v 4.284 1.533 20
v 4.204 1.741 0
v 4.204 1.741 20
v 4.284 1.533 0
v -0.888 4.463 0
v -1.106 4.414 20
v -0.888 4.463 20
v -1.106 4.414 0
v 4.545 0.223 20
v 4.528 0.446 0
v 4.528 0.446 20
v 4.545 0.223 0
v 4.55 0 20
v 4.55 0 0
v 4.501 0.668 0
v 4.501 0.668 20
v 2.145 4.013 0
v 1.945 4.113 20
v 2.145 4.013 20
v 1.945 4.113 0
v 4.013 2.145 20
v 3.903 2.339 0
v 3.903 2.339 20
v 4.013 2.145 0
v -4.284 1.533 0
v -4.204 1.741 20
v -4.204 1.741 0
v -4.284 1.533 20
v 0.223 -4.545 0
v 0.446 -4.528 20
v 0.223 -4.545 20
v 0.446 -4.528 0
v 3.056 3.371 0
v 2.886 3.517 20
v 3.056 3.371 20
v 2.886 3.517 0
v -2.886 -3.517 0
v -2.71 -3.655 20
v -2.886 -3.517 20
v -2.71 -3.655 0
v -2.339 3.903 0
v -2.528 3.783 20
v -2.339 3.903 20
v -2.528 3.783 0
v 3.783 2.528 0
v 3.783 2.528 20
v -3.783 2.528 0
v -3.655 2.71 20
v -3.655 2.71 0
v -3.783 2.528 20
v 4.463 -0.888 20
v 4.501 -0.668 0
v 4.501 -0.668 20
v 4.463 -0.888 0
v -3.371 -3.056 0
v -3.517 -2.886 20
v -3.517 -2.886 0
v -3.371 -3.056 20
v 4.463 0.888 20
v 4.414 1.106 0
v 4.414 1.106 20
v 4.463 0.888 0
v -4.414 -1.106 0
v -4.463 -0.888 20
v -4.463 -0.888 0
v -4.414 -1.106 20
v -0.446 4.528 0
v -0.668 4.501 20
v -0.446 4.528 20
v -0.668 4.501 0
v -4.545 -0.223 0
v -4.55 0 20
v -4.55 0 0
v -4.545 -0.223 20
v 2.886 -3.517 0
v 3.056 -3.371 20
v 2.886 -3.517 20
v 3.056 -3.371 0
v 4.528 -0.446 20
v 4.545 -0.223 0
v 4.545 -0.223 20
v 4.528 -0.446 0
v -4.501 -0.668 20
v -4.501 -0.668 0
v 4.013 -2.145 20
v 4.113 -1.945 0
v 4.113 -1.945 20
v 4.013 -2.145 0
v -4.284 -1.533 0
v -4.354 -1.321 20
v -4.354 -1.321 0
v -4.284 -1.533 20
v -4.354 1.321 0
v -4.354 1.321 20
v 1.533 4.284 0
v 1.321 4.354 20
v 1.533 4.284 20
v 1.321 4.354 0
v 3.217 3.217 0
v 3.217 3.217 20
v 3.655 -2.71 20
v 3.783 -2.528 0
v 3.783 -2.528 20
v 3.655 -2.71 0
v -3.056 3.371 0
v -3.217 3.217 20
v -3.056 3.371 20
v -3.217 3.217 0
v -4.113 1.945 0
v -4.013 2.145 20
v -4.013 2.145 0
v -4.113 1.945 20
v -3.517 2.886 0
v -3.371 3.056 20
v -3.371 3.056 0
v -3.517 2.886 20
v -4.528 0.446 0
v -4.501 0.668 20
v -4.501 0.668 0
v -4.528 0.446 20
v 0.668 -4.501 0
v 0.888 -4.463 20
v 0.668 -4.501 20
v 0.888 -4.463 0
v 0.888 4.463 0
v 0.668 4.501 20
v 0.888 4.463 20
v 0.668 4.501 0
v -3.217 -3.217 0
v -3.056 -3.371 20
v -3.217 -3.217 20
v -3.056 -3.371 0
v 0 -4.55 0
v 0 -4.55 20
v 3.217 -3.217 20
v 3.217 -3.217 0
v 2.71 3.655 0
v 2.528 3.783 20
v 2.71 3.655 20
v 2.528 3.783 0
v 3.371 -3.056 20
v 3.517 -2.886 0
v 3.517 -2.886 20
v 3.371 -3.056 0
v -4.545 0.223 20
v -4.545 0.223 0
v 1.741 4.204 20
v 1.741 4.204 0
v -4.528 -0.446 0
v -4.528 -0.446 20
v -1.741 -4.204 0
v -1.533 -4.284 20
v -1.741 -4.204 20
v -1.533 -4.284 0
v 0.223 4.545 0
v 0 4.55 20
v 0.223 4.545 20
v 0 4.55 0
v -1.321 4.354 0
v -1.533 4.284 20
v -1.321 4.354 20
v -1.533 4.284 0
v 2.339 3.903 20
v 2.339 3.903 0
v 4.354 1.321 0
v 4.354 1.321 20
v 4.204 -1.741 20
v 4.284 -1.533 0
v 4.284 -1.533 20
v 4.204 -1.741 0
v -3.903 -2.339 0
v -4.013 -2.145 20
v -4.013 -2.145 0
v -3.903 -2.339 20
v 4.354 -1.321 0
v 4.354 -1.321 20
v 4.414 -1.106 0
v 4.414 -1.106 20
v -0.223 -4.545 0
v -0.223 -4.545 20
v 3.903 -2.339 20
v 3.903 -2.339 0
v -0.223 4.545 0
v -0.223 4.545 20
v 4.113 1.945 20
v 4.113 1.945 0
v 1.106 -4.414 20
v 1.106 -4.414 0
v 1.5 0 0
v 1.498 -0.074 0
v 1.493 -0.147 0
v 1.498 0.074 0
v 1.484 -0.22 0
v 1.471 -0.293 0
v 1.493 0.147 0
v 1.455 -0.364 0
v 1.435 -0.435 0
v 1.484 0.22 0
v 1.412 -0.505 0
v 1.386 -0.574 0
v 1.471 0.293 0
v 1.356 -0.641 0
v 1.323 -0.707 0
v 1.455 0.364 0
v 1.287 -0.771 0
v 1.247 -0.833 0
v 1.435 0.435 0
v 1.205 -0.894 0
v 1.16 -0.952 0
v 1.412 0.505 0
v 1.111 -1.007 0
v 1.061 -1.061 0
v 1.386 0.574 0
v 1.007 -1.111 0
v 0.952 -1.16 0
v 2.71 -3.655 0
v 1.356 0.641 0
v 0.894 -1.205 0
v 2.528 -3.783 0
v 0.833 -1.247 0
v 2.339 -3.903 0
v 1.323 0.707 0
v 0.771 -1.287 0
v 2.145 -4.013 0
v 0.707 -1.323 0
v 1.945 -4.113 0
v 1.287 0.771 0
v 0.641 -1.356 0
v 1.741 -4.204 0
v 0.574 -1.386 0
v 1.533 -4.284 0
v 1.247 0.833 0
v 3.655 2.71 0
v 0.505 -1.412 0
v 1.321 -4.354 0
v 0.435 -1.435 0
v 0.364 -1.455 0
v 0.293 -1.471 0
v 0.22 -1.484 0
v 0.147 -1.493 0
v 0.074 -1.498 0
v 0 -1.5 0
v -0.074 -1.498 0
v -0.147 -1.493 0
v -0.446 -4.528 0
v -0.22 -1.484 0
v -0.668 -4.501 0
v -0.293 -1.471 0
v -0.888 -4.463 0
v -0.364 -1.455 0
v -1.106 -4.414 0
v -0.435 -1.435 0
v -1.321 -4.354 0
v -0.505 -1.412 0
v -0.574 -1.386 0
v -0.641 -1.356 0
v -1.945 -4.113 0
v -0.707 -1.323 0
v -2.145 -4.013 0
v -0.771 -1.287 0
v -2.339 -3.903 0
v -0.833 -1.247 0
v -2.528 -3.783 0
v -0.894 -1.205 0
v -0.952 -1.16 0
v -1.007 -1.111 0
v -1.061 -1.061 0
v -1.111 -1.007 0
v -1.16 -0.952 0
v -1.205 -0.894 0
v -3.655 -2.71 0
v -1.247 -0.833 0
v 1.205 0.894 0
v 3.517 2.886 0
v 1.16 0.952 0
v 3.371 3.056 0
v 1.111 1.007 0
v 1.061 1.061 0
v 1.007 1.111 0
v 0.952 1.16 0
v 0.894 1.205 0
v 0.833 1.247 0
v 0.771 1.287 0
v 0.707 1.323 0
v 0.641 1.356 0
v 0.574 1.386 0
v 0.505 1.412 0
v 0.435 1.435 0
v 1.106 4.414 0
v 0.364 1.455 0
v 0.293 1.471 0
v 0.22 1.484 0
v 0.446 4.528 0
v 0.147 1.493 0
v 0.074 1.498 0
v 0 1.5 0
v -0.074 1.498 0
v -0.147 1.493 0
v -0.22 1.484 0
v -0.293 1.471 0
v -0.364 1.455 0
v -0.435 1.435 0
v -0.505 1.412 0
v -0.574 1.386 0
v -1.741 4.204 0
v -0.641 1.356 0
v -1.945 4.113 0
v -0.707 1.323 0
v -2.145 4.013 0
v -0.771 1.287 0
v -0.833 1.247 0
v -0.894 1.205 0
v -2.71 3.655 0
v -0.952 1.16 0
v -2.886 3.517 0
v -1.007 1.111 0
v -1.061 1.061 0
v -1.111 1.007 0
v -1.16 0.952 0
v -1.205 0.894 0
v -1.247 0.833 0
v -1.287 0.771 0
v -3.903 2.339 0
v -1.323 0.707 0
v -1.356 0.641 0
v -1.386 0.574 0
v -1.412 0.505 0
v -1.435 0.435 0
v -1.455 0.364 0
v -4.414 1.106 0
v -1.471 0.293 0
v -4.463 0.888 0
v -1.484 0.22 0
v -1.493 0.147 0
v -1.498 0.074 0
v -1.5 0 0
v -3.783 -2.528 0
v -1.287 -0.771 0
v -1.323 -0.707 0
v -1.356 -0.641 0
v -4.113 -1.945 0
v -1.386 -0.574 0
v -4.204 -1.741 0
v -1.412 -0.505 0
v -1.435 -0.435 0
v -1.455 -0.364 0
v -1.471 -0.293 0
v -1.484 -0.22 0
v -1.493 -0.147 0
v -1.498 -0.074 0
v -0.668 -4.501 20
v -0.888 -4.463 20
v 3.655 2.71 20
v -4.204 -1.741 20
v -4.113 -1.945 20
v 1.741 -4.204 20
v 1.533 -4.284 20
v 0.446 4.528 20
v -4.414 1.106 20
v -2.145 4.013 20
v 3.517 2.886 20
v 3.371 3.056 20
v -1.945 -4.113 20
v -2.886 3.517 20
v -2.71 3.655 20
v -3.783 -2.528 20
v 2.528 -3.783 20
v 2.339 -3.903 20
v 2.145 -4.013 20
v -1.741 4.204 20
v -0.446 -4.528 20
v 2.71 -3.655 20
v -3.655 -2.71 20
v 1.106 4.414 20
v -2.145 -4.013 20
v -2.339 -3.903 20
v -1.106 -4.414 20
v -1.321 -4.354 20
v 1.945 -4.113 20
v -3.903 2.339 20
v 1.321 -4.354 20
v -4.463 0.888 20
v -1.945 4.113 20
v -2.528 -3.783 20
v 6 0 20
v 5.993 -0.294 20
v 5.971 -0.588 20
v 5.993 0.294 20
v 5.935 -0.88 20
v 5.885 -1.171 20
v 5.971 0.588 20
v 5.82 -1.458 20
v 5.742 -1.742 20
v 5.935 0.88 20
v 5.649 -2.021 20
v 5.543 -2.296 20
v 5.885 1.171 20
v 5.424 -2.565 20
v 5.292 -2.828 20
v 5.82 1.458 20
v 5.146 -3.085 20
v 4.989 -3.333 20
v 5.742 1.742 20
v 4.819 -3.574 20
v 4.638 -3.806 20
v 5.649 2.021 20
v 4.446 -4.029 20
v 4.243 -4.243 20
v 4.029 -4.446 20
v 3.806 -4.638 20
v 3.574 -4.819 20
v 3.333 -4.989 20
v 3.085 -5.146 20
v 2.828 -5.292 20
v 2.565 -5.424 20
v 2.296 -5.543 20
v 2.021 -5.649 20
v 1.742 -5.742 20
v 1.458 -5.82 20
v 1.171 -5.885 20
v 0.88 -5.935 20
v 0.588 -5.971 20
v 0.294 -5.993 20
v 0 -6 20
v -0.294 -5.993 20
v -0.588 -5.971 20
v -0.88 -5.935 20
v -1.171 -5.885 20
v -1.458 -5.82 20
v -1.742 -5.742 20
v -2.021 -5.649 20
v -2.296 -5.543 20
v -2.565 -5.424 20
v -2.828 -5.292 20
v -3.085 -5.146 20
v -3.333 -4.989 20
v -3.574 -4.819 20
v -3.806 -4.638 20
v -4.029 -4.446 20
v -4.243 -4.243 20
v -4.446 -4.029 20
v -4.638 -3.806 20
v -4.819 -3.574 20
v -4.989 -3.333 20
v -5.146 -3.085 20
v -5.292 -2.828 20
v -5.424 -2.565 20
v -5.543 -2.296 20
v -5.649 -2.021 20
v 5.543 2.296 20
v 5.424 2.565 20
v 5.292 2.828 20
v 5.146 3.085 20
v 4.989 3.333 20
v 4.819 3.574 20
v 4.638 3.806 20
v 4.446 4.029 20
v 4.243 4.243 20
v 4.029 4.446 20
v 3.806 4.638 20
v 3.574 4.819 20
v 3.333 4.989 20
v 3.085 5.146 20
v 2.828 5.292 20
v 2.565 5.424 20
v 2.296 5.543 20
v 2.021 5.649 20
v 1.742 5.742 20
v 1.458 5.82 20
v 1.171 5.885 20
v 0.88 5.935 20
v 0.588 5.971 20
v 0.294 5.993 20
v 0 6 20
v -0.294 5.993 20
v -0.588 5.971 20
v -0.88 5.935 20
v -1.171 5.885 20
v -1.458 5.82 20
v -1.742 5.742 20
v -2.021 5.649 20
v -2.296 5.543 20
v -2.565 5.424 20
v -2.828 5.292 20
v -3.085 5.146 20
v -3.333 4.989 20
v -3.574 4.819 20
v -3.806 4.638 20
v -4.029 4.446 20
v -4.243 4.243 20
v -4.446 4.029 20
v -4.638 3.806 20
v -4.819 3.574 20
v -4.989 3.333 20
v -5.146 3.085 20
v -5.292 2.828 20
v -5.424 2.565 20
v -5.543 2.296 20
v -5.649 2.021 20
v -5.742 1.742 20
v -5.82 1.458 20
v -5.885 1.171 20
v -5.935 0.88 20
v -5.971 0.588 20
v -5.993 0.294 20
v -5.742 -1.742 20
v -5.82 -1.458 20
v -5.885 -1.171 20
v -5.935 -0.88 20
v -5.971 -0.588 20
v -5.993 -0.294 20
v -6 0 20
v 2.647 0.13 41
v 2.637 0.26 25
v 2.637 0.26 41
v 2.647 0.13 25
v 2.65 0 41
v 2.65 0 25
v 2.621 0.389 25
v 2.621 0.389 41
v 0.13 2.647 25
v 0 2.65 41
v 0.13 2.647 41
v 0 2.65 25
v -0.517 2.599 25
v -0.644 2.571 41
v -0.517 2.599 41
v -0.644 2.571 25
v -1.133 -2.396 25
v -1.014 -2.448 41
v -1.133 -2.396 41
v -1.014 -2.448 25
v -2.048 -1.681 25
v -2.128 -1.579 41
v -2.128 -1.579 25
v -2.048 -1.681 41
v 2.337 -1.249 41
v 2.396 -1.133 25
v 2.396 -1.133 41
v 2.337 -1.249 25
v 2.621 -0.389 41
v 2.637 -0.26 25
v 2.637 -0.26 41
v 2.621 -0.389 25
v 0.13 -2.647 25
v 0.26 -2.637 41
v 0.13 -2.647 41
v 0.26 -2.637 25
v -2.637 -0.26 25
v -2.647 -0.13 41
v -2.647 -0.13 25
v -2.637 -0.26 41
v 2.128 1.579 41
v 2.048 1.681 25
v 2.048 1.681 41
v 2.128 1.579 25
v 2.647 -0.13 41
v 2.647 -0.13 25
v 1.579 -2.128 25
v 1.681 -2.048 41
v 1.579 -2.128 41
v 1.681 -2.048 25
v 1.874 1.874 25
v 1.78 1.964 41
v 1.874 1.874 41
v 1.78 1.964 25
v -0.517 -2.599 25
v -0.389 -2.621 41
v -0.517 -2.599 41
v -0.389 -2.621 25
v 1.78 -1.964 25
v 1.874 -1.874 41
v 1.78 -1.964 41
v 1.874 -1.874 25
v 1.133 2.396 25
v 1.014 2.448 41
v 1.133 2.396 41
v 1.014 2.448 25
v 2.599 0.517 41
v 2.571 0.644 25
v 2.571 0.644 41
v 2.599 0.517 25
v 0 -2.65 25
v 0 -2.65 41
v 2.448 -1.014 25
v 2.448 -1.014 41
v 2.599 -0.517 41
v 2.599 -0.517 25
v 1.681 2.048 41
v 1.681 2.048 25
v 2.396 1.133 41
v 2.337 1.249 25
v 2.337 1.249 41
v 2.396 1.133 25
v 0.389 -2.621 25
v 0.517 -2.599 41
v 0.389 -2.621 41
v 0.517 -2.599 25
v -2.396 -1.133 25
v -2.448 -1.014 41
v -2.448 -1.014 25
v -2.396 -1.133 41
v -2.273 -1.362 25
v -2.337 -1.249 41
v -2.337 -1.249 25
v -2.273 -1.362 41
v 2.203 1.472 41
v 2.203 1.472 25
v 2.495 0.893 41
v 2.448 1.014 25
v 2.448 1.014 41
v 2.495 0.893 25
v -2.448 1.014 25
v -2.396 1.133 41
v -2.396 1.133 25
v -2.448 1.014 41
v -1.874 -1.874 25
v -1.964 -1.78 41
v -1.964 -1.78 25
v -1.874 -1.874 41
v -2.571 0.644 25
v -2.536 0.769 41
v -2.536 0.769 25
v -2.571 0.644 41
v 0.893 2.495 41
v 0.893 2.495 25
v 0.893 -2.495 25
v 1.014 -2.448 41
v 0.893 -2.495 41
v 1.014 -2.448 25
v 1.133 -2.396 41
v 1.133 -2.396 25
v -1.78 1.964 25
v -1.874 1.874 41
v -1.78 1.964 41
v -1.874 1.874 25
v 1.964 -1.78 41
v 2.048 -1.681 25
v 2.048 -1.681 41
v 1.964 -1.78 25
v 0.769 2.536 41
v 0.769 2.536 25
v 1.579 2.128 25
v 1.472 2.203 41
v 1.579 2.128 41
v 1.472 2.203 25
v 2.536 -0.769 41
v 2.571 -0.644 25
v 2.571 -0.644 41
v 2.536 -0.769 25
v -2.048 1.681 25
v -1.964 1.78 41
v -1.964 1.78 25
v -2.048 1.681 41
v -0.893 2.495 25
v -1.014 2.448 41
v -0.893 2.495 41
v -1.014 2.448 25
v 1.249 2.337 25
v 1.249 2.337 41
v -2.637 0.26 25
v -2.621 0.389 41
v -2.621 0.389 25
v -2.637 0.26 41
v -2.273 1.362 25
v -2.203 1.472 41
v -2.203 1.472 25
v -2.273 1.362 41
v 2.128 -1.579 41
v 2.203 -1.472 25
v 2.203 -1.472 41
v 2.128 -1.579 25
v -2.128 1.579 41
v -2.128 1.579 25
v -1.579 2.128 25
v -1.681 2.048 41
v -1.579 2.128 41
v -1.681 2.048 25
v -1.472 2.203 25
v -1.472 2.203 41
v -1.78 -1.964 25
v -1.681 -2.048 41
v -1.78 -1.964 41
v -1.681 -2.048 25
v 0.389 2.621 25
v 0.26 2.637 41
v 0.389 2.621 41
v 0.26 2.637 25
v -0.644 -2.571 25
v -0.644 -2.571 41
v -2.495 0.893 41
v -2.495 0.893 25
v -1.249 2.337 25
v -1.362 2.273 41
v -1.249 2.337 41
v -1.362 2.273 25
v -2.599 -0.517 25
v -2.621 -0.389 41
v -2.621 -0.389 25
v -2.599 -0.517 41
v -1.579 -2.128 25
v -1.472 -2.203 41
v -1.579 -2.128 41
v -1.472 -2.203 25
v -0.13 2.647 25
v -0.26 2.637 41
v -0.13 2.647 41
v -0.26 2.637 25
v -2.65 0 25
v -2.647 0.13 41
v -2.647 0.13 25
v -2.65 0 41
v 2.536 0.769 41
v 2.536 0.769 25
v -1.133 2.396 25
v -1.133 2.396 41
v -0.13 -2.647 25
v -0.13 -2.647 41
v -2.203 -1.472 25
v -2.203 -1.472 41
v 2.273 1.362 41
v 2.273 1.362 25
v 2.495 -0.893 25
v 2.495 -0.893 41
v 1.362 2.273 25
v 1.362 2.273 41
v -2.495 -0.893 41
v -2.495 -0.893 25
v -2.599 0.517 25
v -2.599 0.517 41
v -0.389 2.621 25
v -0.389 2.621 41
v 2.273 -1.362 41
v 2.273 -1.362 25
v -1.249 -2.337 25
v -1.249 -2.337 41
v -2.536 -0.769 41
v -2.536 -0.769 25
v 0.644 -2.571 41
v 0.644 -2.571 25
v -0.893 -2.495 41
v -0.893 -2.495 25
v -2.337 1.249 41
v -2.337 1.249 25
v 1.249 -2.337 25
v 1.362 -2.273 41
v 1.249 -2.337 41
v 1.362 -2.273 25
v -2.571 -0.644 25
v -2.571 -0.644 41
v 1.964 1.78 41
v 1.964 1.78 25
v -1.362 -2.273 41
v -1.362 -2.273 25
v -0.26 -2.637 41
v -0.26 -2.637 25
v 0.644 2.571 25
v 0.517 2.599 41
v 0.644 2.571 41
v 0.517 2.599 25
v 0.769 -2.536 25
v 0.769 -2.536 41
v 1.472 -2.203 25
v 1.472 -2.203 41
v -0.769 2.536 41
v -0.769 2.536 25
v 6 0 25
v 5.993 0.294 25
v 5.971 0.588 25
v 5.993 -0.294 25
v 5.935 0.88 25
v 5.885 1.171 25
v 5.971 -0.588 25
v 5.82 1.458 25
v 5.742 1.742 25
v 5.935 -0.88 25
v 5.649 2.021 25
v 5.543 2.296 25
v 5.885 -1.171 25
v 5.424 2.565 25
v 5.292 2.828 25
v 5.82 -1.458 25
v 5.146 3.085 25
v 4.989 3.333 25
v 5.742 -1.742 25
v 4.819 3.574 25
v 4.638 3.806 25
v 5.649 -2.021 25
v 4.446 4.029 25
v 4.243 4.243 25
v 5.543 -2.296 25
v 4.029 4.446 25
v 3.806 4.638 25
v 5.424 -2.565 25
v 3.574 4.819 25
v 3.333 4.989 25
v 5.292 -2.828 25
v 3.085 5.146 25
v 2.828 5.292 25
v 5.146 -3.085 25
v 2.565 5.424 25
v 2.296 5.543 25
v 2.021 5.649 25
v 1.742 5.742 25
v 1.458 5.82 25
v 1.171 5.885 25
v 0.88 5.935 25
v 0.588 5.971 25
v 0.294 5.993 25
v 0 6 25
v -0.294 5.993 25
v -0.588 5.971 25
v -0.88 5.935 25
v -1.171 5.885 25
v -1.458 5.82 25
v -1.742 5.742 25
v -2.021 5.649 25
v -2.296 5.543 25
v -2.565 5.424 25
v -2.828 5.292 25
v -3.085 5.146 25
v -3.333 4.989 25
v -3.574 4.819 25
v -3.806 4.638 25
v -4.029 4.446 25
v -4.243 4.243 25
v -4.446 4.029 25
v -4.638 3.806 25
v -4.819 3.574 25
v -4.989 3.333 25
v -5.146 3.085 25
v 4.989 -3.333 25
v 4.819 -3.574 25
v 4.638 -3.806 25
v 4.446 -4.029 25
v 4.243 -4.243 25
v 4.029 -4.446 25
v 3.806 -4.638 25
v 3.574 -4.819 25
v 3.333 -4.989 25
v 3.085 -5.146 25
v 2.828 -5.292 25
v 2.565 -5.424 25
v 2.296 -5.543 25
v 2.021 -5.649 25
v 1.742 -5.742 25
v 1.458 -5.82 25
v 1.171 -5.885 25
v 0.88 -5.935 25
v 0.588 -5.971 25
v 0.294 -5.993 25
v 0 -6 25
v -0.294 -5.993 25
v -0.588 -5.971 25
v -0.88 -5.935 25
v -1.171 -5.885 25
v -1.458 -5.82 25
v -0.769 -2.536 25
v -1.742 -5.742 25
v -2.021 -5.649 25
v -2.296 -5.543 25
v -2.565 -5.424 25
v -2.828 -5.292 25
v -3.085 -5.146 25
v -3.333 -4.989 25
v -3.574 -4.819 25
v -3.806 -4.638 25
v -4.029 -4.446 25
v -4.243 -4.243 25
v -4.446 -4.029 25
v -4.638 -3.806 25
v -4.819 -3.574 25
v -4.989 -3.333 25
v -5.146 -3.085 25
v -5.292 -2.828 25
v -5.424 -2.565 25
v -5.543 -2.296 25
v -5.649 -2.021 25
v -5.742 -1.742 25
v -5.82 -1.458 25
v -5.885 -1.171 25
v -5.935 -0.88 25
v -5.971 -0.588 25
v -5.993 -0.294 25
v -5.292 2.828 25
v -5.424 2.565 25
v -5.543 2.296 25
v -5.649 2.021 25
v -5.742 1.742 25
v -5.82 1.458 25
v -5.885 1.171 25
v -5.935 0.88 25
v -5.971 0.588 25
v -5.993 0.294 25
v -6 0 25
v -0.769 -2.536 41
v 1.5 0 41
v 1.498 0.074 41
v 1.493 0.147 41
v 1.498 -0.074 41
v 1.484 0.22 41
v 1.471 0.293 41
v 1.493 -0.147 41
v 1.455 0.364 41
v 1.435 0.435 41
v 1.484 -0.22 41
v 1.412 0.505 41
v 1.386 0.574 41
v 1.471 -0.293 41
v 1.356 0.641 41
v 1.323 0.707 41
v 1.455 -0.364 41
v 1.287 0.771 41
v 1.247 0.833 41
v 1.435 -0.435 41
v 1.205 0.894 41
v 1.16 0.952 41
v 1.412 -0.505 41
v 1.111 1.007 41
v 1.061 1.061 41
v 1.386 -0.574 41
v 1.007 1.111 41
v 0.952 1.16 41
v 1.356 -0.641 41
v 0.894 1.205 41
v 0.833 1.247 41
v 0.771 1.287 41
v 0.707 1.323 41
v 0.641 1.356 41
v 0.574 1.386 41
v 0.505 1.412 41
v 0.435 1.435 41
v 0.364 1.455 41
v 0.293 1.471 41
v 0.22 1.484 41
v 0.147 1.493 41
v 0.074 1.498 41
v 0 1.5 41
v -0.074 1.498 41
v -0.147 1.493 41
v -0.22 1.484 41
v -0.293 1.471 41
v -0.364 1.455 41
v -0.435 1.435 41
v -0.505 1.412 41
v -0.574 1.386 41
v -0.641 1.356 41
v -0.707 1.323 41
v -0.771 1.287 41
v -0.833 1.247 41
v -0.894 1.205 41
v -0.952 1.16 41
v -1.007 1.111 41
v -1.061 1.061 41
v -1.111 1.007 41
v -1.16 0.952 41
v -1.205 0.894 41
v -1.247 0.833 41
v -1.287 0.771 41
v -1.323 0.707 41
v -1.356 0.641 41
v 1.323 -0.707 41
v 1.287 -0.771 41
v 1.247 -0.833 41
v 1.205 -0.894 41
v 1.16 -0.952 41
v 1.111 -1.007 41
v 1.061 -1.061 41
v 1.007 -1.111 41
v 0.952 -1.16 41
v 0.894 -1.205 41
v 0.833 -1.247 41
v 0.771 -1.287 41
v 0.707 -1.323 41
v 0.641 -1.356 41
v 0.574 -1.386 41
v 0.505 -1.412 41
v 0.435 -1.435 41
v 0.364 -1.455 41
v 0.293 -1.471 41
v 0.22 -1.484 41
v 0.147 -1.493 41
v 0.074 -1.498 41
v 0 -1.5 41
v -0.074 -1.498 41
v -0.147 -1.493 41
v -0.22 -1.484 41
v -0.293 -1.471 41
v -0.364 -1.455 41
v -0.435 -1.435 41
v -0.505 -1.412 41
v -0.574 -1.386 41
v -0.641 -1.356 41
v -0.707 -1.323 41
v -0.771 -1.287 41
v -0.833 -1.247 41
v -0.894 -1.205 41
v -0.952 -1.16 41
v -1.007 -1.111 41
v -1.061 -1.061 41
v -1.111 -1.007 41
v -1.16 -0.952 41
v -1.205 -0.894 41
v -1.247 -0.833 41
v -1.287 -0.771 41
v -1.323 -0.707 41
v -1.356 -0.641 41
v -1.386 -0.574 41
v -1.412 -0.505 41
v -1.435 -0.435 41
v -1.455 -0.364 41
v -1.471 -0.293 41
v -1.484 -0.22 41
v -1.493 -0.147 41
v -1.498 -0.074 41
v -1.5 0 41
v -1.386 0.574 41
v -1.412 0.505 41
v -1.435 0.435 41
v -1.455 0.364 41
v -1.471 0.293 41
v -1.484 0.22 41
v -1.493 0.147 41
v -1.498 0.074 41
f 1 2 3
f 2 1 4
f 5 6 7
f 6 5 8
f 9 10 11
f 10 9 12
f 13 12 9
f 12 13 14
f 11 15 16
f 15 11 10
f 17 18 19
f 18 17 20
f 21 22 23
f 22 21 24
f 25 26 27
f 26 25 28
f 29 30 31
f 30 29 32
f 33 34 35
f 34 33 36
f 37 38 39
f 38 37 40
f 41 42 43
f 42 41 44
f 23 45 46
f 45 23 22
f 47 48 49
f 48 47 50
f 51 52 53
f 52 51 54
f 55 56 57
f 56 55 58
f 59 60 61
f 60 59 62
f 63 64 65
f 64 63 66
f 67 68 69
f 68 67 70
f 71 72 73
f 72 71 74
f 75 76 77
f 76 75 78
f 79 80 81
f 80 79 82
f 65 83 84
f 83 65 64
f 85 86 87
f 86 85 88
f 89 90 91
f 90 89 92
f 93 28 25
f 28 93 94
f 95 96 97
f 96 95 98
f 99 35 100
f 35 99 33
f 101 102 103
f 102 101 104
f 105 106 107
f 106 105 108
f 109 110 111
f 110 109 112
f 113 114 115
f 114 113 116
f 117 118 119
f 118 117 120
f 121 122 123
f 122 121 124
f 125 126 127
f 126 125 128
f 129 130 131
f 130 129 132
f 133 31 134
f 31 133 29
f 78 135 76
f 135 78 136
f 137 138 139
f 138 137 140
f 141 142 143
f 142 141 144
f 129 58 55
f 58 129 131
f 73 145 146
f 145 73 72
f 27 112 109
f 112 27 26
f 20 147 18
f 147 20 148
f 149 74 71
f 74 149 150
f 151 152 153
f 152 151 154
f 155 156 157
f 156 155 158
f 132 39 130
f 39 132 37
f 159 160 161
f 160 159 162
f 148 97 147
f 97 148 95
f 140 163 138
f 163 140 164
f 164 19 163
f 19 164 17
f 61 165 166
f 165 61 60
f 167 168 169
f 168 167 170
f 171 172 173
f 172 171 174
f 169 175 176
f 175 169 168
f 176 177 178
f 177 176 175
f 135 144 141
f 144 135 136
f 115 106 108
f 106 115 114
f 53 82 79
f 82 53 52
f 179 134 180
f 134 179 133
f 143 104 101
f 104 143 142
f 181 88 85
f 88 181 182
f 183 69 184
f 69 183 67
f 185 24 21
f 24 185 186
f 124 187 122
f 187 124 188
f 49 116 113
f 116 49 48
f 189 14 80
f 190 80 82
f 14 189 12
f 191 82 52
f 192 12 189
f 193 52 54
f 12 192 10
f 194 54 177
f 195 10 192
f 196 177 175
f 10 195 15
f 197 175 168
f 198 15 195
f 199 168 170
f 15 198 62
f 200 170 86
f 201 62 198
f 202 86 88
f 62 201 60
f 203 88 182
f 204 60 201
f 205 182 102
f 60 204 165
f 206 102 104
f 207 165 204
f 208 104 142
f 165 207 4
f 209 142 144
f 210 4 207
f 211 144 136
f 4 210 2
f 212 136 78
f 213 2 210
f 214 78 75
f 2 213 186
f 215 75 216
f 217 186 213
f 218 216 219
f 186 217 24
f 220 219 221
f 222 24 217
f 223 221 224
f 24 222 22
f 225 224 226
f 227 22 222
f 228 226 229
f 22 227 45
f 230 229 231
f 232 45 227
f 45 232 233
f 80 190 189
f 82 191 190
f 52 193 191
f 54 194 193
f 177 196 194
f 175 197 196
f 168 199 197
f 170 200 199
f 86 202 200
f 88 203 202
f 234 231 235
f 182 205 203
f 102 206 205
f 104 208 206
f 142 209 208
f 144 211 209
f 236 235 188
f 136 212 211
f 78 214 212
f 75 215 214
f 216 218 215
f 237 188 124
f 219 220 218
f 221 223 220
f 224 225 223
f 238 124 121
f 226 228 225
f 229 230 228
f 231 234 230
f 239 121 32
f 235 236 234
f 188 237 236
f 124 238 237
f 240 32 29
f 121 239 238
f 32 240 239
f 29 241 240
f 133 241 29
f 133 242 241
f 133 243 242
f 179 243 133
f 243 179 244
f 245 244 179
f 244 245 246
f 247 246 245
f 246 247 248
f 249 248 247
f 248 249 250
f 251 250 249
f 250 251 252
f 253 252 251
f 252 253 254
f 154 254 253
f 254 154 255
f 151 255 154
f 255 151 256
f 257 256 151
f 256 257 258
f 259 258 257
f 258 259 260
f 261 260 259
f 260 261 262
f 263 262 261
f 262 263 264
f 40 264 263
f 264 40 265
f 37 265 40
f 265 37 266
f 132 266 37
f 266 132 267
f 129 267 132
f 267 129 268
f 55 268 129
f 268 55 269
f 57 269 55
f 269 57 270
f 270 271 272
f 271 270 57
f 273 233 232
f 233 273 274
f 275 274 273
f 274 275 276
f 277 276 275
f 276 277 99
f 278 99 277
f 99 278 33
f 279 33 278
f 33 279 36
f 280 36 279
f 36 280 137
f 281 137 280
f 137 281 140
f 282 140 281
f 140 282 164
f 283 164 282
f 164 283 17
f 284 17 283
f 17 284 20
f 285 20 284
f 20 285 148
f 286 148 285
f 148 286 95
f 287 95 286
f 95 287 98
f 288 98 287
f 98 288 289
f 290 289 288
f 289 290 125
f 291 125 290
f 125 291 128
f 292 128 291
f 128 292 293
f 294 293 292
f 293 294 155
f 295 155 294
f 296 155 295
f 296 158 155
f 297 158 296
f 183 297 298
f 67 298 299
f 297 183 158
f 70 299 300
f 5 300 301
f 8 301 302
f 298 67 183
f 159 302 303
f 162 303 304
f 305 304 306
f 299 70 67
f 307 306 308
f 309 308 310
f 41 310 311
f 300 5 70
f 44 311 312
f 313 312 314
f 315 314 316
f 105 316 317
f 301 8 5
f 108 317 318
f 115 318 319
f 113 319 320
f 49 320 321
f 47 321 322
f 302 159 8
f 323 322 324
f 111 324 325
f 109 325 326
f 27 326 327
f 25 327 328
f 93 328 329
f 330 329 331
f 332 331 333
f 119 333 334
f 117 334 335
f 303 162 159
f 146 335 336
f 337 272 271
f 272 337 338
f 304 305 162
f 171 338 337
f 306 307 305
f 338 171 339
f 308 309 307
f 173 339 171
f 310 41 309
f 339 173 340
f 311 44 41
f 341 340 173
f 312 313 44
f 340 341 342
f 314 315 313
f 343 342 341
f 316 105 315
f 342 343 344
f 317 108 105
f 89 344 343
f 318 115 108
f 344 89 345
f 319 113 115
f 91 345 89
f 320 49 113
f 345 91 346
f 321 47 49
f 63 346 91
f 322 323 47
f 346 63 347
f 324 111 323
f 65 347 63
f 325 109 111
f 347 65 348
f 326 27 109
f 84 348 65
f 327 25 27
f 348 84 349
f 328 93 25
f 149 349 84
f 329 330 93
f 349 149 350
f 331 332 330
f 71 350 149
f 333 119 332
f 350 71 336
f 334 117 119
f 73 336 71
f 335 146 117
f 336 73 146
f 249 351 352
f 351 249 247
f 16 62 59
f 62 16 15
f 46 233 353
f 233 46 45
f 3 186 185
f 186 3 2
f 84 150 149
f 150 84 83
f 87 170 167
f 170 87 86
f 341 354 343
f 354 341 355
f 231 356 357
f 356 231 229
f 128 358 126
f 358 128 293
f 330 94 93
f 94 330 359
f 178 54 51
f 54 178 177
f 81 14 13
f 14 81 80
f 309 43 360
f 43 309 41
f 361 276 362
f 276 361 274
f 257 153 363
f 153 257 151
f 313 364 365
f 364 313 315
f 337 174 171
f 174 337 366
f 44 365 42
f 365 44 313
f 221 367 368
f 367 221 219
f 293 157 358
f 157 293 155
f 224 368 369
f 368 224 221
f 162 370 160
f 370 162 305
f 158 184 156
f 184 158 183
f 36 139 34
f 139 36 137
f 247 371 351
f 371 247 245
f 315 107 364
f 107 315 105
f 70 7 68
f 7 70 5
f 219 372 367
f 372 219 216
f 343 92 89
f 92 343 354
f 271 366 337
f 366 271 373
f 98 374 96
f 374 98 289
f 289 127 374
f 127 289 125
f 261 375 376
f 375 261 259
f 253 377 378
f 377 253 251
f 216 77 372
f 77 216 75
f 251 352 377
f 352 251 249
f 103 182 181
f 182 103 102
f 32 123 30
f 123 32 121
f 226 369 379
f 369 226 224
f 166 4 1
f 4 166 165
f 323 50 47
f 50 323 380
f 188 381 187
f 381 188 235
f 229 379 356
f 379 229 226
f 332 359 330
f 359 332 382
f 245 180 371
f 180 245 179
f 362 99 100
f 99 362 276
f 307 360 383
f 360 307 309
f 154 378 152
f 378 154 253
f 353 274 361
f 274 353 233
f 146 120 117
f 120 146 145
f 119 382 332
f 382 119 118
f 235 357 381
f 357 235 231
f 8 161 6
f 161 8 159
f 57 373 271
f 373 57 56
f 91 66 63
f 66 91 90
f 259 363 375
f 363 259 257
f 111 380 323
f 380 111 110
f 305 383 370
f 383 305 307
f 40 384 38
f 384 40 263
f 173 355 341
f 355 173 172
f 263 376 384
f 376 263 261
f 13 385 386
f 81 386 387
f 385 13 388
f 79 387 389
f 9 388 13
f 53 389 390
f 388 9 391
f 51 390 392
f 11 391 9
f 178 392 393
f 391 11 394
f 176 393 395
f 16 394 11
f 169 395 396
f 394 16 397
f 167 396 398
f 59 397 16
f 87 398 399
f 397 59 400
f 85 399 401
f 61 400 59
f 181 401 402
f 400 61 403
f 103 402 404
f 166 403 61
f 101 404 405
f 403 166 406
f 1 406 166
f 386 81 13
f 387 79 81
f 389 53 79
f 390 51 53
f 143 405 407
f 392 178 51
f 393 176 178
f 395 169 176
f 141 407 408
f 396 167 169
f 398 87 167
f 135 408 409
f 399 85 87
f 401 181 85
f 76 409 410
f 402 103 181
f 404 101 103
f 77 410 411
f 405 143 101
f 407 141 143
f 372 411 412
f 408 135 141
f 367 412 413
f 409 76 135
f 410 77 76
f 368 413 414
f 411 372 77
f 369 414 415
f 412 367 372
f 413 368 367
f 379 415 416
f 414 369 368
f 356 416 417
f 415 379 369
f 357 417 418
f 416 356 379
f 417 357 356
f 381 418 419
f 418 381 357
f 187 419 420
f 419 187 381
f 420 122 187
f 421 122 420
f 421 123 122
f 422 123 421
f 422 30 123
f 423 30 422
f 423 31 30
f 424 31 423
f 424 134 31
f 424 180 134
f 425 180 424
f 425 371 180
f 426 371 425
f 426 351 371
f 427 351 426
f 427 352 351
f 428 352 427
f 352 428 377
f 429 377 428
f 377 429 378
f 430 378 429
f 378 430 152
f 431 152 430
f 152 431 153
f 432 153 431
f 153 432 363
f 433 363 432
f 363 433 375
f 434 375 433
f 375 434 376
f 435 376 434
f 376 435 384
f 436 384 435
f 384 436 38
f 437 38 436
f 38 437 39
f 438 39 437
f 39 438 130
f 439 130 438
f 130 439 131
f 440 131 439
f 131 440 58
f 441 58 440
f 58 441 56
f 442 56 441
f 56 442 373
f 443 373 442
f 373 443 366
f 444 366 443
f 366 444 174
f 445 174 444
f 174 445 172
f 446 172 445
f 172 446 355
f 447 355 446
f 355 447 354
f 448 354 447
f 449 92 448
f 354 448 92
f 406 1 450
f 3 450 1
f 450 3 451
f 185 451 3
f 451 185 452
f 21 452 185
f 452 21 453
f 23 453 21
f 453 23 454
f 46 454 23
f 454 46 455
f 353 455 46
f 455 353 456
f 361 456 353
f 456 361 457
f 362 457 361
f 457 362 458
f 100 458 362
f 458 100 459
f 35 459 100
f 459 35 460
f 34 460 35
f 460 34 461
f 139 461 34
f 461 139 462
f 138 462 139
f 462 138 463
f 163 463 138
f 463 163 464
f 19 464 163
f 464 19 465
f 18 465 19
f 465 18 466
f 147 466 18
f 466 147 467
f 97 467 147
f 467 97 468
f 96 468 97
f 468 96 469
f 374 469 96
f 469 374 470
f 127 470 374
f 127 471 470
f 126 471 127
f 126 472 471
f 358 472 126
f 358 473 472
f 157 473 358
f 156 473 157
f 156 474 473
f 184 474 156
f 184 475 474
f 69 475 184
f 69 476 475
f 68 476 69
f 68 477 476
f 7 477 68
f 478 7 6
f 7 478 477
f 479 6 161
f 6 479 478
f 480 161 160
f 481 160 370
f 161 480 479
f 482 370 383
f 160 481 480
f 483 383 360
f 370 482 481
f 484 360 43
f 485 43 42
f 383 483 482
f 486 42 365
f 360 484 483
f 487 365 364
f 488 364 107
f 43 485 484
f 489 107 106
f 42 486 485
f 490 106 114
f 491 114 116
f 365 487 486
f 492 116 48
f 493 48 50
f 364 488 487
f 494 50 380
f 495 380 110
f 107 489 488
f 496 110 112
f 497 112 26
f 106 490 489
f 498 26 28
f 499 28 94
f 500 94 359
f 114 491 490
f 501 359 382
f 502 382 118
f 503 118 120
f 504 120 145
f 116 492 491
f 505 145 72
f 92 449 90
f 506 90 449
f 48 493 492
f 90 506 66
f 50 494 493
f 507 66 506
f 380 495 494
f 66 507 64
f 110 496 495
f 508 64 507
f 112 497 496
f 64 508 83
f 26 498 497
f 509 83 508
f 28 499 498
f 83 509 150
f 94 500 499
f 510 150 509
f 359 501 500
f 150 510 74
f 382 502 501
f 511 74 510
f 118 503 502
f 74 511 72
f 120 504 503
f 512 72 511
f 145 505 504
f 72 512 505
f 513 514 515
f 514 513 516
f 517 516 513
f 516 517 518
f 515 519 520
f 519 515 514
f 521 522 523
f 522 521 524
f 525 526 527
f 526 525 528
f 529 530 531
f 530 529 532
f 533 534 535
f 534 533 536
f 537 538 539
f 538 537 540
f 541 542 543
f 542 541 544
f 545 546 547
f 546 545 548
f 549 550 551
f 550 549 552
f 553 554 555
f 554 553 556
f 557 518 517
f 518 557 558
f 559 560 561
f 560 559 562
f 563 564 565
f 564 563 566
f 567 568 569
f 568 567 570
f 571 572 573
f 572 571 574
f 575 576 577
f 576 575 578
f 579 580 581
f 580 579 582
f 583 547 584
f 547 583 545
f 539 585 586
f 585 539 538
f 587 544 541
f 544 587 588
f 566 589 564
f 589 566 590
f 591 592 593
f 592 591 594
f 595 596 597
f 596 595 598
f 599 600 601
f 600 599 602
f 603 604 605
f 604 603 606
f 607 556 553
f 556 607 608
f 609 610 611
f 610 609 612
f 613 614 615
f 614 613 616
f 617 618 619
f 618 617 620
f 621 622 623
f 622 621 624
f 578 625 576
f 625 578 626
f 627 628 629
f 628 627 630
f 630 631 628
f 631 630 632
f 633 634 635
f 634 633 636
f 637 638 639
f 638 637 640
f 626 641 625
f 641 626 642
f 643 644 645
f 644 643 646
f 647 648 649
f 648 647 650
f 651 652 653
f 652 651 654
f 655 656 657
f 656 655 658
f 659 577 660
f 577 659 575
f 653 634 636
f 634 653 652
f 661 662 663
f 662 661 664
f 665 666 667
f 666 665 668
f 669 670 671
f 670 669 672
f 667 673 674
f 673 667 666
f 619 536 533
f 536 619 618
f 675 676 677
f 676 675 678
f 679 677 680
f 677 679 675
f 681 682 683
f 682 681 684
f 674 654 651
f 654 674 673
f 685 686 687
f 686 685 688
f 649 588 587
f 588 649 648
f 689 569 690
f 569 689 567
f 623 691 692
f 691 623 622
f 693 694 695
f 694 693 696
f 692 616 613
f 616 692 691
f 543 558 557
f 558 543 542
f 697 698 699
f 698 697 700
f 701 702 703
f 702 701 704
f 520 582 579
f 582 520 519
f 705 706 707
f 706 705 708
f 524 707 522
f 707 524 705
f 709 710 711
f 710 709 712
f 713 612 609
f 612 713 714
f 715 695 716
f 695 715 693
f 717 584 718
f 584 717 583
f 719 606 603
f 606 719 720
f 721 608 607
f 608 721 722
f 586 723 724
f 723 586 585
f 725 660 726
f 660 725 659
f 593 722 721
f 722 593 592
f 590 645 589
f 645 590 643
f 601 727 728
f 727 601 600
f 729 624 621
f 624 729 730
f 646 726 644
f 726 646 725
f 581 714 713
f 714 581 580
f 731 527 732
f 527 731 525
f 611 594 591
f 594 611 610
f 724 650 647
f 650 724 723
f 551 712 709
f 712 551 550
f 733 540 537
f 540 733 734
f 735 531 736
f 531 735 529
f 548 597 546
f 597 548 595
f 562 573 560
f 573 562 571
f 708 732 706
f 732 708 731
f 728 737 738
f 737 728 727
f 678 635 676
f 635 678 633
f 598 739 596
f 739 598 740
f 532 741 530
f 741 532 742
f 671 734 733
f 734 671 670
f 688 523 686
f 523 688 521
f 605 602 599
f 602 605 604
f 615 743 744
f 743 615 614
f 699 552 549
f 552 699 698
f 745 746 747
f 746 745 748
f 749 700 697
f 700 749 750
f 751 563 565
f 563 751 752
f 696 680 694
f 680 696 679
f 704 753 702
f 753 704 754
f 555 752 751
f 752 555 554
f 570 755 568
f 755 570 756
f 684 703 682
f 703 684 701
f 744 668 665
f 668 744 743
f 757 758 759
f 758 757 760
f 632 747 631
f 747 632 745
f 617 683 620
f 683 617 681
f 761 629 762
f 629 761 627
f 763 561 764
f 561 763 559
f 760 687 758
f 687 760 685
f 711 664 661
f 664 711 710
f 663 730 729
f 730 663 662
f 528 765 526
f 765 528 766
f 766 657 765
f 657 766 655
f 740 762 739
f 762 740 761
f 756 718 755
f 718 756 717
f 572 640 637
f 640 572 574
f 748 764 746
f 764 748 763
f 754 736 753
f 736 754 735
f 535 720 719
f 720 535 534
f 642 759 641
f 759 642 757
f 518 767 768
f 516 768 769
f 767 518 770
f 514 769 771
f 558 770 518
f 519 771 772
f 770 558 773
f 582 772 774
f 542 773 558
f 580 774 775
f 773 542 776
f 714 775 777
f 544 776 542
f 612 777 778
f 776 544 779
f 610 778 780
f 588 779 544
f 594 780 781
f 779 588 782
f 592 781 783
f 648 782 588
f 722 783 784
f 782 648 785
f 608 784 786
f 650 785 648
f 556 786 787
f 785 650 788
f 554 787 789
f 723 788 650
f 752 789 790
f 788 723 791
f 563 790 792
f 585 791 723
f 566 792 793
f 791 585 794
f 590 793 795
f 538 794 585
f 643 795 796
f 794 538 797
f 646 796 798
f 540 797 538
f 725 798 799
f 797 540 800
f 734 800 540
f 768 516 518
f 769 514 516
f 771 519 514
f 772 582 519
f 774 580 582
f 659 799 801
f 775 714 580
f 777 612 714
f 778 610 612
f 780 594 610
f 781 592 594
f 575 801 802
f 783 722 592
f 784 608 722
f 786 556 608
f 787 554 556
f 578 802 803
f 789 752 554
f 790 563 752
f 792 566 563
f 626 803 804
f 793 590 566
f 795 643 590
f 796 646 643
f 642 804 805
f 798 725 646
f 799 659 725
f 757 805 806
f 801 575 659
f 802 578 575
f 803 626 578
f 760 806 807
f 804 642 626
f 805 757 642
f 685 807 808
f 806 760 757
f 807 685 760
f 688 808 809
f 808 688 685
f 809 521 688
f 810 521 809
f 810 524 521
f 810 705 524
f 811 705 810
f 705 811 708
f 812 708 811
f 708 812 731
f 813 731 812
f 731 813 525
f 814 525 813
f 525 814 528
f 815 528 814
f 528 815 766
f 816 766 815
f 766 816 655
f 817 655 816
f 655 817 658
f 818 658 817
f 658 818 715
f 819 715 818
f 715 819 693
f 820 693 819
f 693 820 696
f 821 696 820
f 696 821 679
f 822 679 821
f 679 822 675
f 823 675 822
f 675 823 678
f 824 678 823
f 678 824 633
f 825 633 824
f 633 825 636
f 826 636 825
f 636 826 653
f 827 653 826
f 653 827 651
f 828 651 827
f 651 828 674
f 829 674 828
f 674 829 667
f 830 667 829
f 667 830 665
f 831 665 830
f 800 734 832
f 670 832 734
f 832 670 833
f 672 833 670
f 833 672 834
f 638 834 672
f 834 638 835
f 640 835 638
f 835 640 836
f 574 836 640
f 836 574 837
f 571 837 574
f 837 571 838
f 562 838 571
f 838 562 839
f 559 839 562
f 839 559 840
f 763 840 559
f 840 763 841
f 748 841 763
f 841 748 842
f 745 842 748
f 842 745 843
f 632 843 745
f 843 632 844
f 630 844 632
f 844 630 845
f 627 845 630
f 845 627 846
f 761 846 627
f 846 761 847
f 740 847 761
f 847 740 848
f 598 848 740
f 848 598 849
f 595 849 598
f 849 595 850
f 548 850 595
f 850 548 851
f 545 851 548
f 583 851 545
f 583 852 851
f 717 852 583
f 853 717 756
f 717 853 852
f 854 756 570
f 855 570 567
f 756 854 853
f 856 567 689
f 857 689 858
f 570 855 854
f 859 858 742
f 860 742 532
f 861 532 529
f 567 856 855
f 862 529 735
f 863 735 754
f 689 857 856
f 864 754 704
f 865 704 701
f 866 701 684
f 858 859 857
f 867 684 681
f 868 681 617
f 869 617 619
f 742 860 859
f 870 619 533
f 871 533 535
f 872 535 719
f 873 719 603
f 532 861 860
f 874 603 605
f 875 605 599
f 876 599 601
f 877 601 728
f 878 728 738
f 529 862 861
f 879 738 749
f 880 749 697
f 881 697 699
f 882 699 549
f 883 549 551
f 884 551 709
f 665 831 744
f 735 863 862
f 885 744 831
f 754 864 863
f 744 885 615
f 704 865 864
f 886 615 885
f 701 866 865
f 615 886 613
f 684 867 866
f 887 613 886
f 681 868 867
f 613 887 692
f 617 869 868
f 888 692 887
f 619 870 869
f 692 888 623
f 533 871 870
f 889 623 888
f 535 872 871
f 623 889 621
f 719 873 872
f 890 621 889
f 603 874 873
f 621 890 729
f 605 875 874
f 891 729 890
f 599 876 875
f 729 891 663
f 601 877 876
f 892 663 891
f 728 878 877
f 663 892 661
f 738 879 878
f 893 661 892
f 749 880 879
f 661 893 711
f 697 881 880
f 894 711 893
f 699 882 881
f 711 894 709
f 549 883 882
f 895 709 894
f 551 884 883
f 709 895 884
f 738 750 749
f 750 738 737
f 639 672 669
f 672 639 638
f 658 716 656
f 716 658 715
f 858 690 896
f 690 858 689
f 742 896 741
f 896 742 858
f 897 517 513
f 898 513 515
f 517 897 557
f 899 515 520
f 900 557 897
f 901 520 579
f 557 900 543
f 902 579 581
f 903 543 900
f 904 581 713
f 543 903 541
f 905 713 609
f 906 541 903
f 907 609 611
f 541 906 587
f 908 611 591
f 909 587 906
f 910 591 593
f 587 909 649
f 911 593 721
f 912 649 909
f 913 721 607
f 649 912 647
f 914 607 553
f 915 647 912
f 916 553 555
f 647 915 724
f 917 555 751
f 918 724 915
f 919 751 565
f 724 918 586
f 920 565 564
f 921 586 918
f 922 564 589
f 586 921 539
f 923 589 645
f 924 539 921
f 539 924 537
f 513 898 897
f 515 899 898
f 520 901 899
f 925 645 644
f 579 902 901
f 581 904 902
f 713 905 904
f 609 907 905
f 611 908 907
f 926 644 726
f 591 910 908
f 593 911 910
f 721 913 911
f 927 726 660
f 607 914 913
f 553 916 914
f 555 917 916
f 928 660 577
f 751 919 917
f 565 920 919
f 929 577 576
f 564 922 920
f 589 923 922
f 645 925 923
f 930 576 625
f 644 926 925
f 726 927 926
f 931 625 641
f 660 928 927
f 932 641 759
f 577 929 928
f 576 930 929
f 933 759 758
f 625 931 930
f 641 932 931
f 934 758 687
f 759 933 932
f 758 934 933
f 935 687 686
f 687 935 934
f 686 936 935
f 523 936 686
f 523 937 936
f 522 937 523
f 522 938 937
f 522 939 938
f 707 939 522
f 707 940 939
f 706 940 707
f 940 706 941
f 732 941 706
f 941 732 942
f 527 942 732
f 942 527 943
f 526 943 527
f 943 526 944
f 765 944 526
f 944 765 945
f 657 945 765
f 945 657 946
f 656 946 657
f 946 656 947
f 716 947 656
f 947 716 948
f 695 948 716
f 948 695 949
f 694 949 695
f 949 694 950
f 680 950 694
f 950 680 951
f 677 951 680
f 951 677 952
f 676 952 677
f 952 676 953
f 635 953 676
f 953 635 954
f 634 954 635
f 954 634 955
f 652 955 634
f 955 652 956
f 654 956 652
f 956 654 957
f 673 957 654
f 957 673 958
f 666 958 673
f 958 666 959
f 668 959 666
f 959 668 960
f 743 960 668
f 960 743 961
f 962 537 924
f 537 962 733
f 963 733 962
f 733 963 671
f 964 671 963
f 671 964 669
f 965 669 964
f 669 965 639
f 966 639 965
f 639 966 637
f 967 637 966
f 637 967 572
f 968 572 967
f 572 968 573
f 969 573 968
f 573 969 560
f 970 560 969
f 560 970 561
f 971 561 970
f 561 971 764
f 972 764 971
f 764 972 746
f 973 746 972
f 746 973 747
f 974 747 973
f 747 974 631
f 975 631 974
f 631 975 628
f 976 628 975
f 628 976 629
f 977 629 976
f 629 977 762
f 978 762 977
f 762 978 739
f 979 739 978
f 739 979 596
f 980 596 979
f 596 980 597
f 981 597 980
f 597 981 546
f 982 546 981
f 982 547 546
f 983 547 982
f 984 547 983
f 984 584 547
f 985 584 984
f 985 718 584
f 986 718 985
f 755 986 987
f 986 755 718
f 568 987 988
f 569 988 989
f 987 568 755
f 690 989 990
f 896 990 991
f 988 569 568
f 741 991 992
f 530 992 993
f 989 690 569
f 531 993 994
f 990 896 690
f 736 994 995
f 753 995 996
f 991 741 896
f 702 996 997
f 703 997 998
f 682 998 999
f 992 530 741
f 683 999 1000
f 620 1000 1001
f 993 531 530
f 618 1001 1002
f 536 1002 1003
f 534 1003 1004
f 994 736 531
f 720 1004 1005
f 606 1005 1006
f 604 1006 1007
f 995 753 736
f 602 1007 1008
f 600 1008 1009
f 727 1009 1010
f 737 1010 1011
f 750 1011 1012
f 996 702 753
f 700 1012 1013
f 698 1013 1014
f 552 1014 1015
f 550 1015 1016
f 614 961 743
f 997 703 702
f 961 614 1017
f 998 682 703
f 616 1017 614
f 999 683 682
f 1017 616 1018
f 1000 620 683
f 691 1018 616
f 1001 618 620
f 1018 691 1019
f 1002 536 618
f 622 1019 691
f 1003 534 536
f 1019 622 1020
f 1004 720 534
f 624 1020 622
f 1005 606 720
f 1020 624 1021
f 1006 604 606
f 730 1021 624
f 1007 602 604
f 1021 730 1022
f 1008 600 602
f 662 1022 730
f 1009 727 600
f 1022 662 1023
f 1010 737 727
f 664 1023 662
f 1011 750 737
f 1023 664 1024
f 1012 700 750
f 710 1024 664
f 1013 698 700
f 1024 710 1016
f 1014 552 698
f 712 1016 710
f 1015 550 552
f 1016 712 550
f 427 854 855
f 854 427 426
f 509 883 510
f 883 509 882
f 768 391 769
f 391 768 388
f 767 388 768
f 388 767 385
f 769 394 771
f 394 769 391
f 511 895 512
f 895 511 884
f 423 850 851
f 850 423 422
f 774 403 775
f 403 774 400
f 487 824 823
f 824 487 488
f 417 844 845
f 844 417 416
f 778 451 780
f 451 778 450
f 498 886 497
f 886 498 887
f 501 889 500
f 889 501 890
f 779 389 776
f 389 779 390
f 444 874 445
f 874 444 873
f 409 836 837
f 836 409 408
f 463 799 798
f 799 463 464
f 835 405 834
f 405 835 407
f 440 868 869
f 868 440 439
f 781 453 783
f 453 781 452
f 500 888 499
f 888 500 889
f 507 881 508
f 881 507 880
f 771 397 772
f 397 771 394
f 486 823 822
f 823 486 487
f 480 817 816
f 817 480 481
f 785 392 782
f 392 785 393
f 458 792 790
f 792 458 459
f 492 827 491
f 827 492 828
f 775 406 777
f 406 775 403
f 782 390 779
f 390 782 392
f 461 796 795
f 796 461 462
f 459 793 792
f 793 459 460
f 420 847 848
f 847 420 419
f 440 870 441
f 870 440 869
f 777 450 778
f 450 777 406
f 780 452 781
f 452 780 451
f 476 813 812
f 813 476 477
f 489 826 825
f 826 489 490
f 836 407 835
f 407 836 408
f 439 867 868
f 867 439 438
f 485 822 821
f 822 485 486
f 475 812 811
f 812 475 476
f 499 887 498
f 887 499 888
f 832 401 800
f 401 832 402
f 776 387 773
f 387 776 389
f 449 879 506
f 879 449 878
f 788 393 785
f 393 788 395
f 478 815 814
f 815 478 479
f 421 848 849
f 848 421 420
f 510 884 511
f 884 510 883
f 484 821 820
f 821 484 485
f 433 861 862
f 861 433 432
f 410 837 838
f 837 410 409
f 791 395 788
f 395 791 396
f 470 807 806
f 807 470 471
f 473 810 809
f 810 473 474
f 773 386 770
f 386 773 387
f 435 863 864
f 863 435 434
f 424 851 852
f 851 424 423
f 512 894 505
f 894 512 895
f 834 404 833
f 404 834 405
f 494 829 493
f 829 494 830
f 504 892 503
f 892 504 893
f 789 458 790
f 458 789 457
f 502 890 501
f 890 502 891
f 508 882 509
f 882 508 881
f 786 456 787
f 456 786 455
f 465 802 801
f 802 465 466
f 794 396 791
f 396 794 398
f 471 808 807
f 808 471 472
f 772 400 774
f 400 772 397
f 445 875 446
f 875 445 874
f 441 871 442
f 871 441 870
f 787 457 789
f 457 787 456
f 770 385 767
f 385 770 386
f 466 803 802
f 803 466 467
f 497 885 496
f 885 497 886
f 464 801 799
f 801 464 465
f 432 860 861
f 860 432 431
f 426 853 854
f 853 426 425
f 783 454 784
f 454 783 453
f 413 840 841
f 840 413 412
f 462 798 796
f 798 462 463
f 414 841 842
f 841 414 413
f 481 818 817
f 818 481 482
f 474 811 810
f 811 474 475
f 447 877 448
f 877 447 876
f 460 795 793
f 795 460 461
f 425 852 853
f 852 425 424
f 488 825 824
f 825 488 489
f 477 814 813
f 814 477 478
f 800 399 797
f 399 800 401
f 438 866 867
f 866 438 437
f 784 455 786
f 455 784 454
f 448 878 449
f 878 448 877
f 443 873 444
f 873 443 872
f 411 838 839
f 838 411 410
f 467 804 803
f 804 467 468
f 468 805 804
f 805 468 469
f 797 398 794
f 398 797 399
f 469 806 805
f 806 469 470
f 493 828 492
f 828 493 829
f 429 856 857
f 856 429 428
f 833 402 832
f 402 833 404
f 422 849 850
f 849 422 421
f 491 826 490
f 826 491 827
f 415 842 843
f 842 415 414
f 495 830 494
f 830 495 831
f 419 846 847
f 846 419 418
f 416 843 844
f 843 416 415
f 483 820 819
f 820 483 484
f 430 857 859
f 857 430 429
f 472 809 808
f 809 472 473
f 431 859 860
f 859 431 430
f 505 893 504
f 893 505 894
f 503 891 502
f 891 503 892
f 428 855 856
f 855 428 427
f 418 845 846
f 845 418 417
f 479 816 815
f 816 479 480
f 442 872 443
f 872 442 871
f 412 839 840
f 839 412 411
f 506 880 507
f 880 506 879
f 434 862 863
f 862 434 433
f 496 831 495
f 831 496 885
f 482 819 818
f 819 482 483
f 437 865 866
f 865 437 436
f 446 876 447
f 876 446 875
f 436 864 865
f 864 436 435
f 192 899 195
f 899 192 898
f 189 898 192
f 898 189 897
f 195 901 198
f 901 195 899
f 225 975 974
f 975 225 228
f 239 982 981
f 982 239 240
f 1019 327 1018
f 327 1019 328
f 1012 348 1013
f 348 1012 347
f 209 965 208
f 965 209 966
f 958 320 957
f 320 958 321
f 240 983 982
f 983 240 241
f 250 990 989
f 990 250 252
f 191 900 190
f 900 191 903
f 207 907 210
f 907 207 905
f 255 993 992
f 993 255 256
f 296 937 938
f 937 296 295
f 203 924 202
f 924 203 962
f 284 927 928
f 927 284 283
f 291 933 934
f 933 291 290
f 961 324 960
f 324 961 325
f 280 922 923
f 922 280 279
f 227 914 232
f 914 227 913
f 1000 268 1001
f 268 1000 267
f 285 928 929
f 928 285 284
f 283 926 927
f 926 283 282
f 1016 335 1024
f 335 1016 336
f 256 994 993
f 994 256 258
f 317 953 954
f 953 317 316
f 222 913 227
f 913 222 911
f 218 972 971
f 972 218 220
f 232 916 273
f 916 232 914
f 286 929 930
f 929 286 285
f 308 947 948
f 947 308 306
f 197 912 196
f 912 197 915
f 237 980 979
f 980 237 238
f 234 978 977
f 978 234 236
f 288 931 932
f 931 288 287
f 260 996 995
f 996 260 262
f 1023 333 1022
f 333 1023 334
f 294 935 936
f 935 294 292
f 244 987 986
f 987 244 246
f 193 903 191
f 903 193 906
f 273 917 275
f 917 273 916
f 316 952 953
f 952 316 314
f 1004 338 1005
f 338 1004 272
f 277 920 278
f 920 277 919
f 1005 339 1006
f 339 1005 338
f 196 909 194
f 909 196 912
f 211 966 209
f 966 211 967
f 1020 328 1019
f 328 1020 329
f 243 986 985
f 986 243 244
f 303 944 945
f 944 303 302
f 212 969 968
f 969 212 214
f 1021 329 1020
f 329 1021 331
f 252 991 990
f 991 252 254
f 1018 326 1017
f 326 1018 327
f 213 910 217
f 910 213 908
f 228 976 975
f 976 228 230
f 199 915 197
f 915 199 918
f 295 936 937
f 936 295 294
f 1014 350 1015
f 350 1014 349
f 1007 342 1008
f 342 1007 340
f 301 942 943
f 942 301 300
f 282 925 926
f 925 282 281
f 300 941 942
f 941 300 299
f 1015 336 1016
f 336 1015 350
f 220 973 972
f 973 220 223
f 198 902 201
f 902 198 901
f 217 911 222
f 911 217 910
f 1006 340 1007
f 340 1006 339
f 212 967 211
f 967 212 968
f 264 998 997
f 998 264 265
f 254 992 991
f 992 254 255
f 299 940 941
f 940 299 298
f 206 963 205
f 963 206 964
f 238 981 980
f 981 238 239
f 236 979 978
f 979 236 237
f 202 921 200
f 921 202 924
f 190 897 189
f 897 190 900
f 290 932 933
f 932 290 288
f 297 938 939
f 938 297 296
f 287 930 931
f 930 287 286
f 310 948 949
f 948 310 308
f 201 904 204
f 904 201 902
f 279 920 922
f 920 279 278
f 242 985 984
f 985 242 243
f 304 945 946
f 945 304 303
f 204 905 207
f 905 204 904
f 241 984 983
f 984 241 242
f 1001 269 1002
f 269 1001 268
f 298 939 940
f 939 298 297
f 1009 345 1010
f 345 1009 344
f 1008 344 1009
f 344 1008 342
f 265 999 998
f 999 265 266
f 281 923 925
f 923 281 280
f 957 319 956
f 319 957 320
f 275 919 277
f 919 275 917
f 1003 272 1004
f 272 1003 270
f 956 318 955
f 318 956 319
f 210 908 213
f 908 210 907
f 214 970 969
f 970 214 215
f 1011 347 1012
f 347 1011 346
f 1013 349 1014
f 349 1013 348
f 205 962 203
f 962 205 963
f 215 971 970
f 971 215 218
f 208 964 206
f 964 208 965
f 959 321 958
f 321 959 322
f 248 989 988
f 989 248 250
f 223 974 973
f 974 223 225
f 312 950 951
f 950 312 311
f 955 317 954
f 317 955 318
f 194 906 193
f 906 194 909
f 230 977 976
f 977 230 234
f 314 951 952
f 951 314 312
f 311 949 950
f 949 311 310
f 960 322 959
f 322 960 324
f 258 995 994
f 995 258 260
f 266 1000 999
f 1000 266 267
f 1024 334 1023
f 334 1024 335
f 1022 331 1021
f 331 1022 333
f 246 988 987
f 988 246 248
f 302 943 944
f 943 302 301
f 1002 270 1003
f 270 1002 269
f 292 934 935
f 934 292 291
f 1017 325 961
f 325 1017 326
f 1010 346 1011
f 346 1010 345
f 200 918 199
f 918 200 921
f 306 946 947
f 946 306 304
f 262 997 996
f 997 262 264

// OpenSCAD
// Hose-barb reducer: joins 8 mm ID silicone tubing to 5 mm ID silicone tubing
// Print orientation: standing upright along +Z
// Units: mm. A 3 mm bore runs straight through the full length.

// ---------------- Parameters ----------------
reducer_length      = 41;   // total length (z = 0 to z = 41)
bore_d              = 3;    // through-bore diameter

// Lower section (z = 0..20): barbs for 8 mm tubing
lower_section_h     = 20;   // lower section height
barb_d_start        = 7.5;  // barb outer diameter at bottom of each barb
barb_d_top          = 9.5;  // barb outer diameter at top of each barb
barb_h              = 10;   // each barb height
barb_count          = 2;    // number of stacked barbs
barb_overlap        = 0;    // vertical overlap between barbs (none)

// Collar (z = 20..25)
collar_d            = 12;   // collar diameter
collar_h            = 5;    // collar height

// Upper section (z = 25..41): barbs for 5 mm tubing
upper_section_h     = 16;   // upper section height (25 to 41)
barb_d_start_u      = 6.5;  // barb outer diameter at bottom of each upper barb
barb_d_top_u        = 5.0;  // barb outer diameter at top of each upper barb
barb_h_u            = 8;    // each upper barb height
barb_count_u        = 2;    // number of stacked upper barbs
barb_overlap_u      = 0;    // vertical overlap between upper barbs

eps                  = 0.5;  // cutter overshoot past faces

$fn = 128;

// ---------------- Helpers ----------------
// Sawtooth outer diameter along Z: grows from start to top, then steps back
function saw_d(z, d_start, d_top, h) =
    (z < h * 0.8) ? d_start + (d_top - d_start) * z / (h * 0.8) :
                   d_start + (d_top - d_start) * 0.8;

// ---------------- Model ----------------
difference() {
    union() {
        // Lower section: stacked barbs
        for (i = [0 : barb_count - 1])
            translate([0, 0, i * (barb_h + barb_overlap)])
                cylinder(h = barb_h,
                         d = saw_d([0, barb_h],
                                  barb_d_start, barb_d_top, barb_h));

        // Collar
        translate([0, 0, lower_section_h])
            cylinder(h = collar_h, d = collar_d);

        // Upper section: stacked barbs
        for (i = [0 : barb_count_u - 1])
            translate([0, 0, lower_section_h + collar_h +
                       i * (barb_h_u + barb_overlap_u)])
                cylinder(h = barb_h_u,
                         d = saw_d([0, barb_h_u],
                                  barb_d_start_u, barb_d_top_u, barb_h_u));
    }

    // Through-bore
    translate([0, 0, -eps])
        cylinder(h = reducer_length + 2 * eps, d = bore_d);
}
